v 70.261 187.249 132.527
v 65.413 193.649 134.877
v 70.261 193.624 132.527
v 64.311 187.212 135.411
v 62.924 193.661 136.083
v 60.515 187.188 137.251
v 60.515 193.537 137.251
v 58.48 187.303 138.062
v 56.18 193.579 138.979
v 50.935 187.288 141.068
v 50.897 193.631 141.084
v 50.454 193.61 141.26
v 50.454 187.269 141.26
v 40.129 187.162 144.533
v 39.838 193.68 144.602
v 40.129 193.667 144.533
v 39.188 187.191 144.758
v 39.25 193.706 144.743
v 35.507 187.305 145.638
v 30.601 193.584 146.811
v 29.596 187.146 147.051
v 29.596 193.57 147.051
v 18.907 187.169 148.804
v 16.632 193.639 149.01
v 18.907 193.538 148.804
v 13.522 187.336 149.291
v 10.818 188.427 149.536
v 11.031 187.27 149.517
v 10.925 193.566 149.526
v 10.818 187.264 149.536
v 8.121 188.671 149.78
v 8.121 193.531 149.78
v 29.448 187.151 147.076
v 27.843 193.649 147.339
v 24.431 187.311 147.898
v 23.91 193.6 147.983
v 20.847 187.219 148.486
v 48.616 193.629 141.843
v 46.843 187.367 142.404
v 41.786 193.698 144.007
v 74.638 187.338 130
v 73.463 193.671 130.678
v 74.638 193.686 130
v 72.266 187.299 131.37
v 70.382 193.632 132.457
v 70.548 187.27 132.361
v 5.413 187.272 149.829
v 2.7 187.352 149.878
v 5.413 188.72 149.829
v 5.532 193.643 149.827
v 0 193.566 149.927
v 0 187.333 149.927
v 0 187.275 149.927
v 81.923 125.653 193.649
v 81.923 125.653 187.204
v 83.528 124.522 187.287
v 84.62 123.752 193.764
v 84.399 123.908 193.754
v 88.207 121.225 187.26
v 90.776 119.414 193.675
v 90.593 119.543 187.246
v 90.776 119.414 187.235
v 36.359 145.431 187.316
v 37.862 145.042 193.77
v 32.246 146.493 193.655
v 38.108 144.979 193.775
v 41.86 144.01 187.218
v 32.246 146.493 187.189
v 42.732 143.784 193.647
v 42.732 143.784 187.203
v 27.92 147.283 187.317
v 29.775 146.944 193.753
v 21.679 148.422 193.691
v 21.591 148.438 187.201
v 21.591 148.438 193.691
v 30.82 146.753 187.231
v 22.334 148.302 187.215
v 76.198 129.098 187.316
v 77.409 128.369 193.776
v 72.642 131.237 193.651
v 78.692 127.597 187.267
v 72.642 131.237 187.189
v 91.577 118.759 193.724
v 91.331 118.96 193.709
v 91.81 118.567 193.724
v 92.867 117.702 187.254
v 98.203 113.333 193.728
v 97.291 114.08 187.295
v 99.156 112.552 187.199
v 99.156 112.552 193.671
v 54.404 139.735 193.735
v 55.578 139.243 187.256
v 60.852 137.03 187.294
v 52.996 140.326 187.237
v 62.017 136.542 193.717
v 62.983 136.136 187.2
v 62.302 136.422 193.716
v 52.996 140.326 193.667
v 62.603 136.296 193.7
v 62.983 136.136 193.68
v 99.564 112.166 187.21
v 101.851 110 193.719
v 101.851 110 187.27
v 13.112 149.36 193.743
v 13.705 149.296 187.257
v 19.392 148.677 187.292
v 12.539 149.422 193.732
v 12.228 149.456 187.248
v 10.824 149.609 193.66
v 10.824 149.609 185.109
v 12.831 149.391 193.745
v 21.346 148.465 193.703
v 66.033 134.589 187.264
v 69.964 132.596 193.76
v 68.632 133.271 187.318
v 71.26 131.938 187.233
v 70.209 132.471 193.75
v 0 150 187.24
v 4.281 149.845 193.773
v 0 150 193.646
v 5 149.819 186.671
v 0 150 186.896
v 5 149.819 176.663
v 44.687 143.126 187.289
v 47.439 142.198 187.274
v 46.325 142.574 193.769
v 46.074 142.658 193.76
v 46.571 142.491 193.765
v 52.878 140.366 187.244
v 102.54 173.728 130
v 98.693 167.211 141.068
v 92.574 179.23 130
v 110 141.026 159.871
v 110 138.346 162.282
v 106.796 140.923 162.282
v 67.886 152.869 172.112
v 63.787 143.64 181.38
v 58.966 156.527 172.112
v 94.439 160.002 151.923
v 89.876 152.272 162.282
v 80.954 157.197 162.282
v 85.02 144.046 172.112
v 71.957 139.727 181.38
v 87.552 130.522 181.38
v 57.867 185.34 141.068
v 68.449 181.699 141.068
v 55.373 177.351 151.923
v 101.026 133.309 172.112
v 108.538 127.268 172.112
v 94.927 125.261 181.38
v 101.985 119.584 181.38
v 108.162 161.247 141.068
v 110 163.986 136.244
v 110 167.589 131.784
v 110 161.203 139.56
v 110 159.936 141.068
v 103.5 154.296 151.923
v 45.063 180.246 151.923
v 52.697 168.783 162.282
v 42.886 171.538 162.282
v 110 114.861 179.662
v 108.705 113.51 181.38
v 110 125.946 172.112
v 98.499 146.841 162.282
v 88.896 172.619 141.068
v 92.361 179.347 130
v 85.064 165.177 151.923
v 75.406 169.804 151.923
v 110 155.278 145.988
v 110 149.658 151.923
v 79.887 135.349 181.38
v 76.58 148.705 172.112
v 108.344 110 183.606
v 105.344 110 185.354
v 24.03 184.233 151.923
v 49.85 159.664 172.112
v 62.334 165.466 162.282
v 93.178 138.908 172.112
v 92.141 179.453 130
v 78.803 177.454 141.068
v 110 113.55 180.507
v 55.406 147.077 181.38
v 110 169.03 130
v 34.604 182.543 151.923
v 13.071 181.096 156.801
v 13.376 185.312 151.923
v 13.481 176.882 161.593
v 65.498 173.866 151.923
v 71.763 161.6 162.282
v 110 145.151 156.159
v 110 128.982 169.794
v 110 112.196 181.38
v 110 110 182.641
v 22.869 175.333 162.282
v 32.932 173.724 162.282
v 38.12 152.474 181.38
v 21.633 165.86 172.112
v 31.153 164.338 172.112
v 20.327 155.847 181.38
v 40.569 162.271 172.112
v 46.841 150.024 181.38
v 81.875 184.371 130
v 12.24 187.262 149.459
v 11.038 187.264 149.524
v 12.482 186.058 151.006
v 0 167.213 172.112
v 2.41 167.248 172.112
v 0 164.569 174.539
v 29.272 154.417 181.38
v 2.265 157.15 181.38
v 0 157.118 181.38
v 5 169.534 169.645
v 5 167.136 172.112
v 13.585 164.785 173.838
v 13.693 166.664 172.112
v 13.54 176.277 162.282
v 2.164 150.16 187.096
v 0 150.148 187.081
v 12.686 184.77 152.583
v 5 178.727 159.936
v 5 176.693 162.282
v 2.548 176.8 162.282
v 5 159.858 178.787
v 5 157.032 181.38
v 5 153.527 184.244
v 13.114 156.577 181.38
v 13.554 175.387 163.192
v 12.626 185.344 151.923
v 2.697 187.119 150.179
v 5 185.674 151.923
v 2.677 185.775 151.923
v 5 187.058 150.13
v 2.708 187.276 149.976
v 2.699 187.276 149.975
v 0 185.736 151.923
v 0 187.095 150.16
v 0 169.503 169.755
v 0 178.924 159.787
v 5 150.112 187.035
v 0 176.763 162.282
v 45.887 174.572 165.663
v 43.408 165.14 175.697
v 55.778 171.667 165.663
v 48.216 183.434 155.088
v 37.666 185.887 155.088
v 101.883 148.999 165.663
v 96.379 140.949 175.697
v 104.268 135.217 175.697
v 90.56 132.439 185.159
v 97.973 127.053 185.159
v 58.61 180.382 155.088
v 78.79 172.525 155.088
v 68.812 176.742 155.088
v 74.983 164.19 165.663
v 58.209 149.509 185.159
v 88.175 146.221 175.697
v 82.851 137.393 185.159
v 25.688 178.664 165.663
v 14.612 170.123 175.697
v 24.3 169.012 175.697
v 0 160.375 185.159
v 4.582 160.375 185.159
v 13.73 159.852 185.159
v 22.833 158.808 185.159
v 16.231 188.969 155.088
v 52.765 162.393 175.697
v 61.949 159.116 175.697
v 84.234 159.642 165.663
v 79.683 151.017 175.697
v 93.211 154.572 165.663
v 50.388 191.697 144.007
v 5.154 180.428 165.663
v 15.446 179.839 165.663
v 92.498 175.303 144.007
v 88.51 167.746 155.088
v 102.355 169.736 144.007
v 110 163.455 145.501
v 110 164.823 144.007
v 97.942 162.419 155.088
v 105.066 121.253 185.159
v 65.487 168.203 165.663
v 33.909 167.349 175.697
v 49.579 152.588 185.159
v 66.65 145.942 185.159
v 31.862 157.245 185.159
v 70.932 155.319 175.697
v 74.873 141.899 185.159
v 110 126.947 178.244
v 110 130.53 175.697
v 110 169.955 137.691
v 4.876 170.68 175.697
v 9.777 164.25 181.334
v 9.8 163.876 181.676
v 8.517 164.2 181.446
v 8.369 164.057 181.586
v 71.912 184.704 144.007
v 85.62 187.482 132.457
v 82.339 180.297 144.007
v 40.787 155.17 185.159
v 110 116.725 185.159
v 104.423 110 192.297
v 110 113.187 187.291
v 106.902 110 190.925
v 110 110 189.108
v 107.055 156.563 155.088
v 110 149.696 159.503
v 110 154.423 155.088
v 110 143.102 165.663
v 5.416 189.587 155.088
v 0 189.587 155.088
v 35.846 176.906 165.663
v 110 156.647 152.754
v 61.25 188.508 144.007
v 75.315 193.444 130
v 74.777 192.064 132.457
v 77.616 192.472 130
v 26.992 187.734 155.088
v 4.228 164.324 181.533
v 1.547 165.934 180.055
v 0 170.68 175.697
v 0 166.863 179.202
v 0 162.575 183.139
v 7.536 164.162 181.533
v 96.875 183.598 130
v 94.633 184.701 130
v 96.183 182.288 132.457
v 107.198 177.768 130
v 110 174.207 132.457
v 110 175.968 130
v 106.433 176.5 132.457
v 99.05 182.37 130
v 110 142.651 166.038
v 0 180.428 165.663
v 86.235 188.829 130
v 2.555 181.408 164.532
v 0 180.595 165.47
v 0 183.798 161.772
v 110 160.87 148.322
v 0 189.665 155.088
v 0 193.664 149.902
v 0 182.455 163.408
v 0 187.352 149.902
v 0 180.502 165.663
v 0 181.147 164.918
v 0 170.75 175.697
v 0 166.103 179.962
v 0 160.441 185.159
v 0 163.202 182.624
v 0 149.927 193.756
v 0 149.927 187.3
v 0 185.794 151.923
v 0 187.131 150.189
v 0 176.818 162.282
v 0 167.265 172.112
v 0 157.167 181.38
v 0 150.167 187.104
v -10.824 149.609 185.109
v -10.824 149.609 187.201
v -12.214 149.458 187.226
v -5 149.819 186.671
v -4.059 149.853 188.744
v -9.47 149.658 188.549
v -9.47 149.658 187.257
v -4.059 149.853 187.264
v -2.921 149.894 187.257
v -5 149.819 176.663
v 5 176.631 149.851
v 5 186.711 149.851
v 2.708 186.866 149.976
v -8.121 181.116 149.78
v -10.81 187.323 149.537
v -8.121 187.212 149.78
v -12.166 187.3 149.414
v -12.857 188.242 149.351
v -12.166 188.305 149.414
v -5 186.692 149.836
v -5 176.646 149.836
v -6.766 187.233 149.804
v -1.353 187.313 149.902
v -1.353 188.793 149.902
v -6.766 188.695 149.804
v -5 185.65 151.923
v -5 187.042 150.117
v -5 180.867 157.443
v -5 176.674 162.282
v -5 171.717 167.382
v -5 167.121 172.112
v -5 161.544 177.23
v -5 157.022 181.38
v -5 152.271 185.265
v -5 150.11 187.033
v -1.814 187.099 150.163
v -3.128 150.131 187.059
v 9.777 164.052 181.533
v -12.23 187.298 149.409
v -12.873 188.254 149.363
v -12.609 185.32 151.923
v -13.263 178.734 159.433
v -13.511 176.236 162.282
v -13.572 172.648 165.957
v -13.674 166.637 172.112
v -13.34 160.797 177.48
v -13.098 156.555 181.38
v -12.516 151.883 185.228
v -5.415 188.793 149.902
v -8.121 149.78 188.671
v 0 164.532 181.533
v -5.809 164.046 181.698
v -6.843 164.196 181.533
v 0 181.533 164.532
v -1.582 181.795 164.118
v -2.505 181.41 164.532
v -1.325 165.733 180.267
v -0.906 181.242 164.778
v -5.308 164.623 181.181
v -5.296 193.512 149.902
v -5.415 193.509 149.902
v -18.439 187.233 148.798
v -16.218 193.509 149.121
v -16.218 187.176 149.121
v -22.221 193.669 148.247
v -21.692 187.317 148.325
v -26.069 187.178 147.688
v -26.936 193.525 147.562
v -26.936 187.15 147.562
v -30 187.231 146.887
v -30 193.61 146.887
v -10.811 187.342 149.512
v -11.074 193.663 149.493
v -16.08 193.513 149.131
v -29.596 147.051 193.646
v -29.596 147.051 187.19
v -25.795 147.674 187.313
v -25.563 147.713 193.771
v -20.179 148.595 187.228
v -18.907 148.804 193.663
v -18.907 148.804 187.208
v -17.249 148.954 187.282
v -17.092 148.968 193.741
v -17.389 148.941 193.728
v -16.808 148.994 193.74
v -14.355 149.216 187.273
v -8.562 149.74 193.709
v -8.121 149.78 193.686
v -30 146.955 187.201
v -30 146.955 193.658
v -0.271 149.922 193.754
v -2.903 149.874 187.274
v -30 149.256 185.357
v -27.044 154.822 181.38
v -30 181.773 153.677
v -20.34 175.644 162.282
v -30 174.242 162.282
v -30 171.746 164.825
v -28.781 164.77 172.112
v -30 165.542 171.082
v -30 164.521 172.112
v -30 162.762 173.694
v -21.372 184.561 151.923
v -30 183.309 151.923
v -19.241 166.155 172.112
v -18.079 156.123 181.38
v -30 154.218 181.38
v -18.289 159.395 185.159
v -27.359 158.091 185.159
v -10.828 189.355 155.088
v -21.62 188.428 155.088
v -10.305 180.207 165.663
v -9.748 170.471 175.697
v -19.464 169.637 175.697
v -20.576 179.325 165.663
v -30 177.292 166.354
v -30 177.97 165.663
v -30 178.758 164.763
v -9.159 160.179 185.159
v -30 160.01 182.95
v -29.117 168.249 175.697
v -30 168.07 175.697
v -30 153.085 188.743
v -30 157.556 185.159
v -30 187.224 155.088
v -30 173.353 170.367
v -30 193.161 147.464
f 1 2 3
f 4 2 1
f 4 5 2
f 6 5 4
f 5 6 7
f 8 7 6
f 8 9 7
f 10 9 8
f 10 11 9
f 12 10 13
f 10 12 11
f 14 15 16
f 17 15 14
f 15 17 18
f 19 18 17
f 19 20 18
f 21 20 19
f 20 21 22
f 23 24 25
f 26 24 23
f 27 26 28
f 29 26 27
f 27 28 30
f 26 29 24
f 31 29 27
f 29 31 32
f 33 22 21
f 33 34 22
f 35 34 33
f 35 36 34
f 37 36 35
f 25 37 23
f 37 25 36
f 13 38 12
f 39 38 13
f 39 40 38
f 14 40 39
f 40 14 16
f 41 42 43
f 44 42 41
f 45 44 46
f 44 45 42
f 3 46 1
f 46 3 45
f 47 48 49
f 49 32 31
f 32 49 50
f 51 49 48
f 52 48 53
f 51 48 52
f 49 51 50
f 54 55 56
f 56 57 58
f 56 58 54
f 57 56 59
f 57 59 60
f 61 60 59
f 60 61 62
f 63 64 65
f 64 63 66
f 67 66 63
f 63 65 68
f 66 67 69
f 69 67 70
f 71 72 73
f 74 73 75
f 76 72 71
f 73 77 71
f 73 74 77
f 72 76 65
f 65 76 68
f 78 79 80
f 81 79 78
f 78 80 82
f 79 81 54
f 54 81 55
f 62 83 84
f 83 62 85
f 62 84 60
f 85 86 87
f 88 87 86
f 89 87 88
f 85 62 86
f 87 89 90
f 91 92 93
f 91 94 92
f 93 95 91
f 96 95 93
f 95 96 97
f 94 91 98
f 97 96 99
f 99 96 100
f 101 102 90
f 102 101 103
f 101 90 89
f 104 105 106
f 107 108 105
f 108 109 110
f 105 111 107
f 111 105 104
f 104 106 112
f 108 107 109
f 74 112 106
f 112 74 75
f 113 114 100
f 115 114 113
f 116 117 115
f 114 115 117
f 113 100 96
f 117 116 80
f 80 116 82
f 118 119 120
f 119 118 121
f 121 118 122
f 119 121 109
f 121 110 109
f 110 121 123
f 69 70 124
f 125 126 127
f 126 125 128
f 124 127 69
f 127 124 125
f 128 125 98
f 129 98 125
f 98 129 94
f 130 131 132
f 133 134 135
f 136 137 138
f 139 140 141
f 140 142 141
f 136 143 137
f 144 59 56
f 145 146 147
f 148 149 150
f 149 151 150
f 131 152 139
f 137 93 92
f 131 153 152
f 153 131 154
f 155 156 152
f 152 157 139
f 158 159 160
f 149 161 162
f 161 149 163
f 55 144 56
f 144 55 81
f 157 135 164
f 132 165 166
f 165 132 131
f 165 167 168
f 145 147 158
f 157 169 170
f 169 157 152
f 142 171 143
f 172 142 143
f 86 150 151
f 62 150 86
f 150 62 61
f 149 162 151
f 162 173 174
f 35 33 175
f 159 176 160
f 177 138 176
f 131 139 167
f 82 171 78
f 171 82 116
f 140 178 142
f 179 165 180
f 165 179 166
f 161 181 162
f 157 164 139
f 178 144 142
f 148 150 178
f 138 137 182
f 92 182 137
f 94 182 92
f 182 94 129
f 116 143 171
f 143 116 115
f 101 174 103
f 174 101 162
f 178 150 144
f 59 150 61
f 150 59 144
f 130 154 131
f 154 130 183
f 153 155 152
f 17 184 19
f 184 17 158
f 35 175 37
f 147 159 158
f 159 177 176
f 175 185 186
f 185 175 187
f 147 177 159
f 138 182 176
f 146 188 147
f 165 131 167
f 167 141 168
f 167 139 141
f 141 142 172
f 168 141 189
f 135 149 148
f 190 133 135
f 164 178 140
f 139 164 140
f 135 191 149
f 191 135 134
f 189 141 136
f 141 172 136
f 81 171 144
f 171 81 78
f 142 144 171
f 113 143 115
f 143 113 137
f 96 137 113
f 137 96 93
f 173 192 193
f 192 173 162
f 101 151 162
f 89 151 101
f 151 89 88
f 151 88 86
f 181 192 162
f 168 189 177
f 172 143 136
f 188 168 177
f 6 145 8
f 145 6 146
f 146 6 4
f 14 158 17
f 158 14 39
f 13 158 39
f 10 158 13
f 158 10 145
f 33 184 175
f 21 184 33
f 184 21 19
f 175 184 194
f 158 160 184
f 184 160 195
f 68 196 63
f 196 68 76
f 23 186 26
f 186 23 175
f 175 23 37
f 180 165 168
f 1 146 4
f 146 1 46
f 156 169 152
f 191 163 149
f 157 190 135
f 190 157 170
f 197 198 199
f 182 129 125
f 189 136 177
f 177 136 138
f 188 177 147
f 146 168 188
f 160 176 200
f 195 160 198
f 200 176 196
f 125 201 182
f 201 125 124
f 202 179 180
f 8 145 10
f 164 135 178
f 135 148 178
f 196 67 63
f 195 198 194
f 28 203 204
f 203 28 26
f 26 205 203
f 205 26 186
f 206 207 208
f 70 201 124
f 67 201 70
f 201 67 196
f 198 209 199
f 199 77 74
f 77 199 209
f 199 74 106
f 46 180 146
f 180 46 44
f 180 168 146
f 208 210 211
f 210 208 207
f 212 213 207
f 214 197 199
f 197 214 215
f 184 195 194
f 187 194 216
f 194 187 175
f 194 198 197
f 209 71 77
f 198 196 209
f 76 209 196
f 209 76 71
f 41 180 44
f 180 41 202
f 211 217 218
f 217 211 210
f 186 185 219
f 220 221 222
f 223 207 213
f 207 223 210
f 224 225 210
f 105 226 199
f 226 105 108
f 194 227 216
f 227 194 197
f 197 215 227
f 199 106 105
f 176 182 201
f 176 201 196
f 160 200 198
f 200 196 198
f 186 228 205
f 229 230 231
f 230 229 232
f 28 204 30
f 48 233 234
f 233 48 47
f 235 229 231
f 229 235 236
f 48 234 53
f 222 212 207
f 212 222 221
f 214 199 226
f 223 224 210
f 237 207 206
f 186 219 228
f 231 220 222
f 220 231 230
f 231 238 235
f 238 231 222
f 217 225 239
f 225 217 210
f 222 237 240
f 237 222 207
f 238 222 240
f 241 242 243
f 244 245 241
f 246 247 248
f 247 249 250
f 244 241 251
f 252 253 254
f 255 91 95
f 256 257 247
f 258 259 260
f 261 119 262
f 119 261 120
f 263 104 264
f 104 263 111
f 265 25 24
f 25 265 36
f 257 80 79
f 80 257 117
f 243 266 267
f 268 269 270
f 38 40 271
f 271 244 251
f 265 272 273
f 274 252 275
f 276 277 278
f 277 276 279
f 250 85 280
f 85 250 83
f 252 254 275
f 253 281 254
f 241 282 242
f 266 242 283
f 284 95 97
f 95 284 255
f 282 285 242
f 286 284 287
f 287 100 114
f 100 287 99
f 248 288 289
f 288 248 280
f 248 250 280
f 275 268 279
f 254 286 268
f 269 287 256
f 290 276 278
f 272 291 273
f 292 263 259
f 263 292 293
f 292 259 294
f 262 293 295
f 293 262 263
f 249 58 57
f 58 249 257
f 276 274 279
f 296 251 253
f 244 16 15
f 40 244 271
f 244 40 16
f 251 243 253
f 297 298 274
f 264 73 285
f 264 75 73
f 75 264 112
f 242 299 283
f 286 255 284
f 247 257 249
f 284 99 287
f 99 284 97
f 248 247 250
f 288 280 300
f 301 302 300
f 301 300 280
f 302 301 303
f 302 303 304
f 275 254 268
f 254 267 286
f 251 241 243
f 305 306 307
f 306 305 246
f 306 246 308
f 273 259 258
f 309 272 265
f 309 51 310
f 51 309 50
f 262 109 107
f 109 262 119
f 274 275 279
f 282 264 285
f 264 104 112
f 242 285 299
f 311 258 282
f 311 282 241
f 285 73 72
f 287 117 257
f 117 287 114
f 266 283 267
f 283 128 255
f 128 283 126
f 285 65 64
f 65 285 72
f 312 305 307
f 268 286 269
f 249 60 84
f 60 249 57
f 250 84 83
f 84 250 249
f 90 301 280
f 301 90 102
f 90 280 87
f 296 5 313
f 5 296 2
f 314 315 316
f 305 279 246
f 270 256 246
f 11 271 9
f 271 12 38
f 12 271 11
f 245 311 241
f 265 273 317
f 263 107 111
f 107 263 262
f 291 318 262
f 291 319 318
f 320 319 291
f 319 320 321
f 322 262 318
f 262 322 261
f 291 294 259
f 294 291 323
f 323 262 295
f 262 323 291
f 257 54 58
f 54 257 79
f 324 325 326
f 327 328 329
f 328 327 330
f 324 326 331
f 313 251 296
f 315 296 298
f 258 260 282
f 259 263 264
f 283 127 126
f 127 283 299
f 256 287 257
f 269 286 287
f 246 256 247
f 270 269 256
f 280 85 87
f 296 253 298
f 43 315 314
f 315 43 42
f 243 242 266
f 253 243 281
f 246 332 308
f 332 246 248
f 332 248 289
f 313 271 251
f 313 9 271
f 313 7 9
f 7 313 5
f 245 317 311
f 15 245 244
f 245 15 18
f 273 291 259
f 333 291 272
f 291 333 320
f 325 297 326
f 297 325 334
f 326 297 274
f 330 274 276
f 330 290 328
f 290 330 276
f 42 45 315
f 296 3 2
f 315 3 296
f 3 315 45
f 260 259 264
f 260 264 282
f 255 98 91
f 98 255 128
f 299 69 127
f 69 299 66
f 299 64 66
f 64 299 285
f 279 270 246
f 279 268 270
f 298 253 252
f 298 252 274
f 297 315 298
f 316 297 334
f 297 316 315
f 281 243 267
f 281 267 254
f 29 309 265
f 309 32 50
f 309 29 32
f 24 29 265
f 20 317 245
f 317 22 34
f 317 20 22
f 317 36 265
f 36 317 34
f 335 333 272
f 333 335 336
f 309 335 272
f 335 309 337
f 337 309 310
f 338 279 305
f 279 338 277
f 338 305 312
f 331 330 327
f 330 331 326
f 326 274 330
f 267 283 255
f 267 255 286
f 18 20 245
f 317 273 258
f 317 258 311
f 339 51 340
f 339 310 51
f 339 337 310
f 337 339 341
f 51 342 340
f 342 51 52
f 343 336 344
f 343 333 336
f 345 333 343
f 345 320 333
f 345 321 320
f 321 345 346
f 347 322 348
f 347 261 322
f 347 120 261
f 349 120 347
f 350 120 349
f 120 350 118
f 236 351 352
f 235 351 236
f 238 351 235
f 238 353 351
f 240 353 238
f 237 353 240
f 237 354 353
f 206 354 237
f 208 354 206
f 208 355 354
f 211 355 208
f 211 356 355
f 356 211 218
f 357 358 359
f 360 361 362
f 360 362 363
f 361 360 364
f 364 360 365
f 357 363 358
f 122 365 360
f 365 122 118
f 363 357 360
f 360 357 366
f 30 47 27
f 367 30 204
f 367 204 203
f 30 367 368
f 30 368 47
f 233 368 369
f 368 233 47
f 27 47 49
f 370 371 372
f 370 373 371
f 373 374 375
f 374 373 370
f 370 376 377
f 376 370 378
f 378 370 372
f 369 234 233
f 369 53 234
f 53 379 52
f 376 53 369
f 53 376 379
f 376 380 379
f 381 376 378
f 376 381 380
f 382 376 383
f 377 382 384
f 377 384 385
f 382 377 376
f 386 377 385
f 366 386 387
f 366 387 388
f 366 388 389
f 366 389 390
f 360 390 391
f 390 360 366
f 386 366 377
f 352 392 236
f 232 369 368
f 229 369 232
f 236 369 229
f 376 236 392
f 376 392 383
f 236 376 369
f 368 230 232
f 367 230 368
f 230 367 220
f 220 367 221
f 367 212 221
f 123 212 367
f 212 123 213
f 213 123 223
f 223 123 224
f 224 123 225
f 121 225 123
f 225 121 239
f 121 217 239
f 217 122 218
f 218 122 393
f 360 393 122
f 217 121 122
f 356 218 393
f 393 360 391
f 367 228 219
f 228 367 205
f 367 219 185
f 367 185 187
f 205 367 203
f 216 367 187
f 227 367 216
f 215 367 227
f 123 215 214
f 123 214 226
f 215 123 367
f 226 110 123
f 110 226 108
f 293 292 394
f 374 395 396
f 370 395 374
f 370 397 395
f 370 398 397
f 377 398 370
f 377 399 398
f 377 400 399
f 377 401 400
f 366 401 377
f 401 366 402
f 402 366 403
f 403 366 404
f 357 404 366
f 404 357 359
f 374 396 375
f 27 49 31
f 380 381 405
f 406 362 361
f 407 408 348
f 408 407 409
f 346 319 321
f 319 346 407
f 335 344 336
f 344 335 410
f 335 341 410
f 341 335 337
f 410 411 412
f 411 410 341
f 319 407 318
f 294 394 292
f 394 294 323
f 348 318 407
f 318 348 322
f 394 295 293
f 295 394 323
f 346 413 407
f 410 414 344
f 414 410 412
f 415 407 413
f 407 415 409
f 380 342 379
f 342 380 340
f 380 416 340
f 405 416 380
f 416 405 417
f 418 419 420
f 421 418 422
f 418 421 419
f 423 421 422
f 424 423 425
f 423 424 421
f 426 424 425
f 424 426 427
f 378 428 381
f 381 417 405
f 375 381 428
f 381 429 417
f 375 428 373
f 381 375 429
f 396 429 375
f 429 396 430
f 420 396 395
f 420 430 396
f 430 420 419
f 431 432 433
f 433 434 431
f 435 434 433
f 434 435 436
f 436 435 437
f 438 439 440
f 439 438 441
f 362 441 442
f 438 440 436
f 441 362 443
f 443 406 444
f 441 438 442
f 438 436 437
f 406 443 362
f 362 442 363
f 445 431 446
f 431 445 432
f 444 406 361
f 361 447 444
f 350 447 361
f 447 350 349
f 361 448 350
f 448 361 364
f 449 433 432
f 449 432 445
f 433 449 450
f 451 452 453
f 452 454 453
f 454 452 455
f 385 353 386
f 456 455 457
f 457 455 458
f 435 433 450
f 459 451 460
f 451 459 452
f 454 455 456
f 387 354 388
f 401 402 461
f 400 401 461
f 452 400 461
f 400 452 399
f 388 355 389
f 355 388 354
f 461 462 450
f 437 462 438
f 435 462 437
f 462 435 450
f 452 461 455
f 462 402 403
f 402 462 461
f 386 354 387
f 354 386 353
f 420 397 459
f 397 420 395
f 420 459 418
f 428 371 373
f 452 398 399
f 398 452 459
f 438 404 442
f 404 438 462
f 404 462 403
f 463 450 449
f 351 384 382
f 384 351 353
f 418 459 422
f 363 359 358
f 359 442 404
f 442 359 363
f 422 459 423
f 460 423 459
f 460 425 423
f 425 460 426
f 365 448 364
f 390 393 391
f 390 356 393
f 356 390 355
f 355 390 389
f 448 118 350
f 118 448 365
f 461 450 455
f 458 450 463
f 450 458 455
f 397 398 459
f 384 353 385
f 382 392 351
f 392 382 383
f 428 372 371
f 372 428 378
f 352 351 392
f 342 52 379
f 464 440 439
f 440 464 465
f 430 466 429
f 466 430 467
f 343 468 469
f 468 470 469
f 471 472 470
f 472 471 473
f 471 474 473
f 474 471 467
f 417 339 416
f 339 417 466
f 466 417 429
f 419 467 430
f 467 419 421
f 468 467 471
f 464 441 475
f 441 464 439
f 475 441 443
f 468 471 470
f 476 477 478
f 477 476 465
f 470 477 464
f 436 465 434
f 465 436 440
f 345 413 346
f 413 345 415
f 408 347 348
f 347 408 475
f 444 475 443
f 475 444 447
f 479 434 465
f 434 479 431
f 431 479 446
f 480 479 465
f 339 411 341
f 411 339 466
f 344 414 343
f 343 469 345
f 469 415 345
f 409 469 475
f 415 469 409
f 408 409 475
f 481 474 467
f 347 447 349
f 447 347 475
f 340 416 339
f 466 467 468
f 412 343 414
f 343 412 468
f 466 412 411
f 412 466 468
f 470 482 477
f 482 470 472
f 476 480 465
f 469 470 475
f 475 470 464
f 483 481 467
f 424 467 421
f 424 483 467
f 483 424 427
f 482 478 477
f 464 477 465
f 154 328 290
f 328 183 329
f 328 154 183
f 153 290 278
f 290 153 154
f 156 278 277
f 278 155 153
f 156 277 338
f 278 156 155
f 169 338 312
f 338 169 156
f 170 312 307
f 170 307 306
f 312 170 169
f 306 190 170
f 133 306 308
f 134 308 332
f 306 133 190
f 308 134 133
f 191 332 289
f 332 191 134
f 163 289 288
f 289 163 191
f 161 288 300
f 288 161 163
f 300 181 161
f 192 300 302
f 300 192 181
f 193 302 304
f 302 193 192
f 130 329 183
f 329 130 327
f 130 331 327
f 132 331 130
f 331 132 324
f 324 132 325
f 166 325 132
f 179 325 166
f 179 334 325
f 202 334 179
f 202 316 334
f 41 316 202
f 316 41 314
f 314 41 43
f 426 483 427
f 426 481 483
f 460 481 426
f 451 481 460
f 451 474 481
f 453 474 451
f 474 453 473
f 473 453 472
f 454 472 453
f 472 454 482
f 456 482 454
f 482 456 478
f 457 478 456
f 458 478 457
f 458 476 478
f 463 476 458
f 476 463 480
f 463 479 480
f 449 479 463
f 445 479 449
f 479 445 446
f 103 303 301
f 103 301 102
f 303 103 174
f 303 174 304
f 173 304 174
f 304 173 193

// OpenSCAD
// file: ../motors/MN5212.scad
use <../utils.scad>

module MN5212(){

	render(){
		translate([0,0, 42.5 / 2 - 23 / 2 - 4.9 - 6])
			cylinder(
				h = 23,
				r = 59 / 2,
				$fa = fa(59 / 2),
				center = true);
		translate([0,0, 42.5 / 2 - 4.9 / 2 - 6])
			cylinder(
				h = 4.9,
				r1 = 59 / 2,
				r2 = 24.8 / 2,
				$fa = fa(59 / 2),
				center = true);
		translate([0,0, - 42.5 / 2 + 5.6 / 2 + 3])
			cylinder(
				h = 5.6,
				r1 = 44 / 2,
				r2 = 59 / 2,
				$fa = fa(59 / 2),
				center = true);
		translate([0, 0, 42.5 / 2 - 3])
			cylinder(
				h = 6,
				r = 4 / 2,
				$fa = fa(4 / 2),
				center = true);
		translate([0, 0, - 42.5 / 2 + 1.5])
			cylinder(
				h = 3,
				r = 6 / 2,
				$fa = fa(6 / 2),
				center = true);
	}

}
// file: ../servos/HS_5065MG.scad
use <../utils.scad>

module HS_5065MG(){

	length = 23.75;
	width = 11.68;
	depth = 20.32;
	wing_width = 32.38;
	wing_thick = 3.43;
	shaft_offset = 6;
	hole_spacing = 28.32;
	shaft_height = 26.16;
	shaft_length = 2;

	module mounting_hole(){
		mh_rad = 2 / 2;
		translate(
			[
				hole_spacing / 2,
				0,
				depth / 2 - wing_thick / 2
			])
			cylinder(h = 5, r = mh_rad, $fa = fa(mh_rad), center = true);
	}

	difference(){
		union(){
			cube([length, width, depth], center = true);
			translate([0, 0, depth / 2 - wing_thick / 2])
				cube([wing_width, width, wing_thick], center = true);
			translate(
				[
					- length / 2 + shaft_offset,
					0,
					shaft_height - length / 2 + shaft_length / 2
				])
				cylinder(
					h = shaft_length,
					r = 1.5,
					$fa = fa(1.5),
					center = true);
		}	union(){

			mounting_hole();
			mirror() mounting_hole();
		}
	}
}

HS_5065MG();
// file: ../servos/LS_0006_servo.scad
// Author Michael Marques (DrYerzinia)

use <../utils.scad>

module ls_0006_servo(){
	
	length = 21.4;
	depth = 19.9;
	thickness = 11.65;

	gear_height = 2.6;
	gear_bump_height = 0.7;
	gear_bump_diameter = 1.97;
	gear_outer_bump_diameter = 6;
	gear_bump_offset = 12.2;

	shaft_height = 2.4;
	shaft_diameter = 3.74;
	shaft_offset = thickness / 2;
	shaft_screw_diameter = 1.3;
	
	wing_outer_width = 8.5;
	wing_top_off = 3.8;
	wing_length = 3.8;
	wing_thickness = 1.2;
	wing_hole_diameter = 1.85;
	wing_hole_edge_dist = 2;

	module wing_hole(){
		translate(
			[
				length / 2 + wing_hole_edge_dist,
				0,
				depth/2 - wing_top_off - wing_thickness / 2
			])
			cylinder(
				h = wing_thickness + 1,
				r = wing_hole_diameter / 2,
				$fn = 16,
				center = true);
	}

	module wing(){
		translate(
			[
				length / 2,
				thickness / 2,
				depth/2 - wing_top_off - wing_thickness
			])
			rotate([0,0,-90])
				trapezoid(
					thickness,
					wing_outer_width,
					wing_length,
					wing_thickness);
	}

	// Body
	cube([length, thickness, depth], center = true);

	difference(){
		union(){

			wing();
			mirror() wing();

			// Gear Bumps
			translate([0, 0, depth/2 + gear_height / 2]){
				translate([length / 2 - gear_bump_offset, 0, 0])
					cylinder(
						h = gear_height,
						r = gear_outer_bump_diameter / 2,
						$fn = 16,
						center = true);
				translate([length / 2 - gear_bump_offset, 0, gear_height/2 + gear_bump_height / 2])
					cylinder(
						h = gear_bump_height,
						r = gear_bump_diameter / 2,
						$fn = 16,
						center = true);
				translate([length / 2 - shaft_offset, 0, 0])
					cylinder(
						h = gear_height,
						r = thickness / 2,
						$fn = 32,
						center = true);
				// Shaft
				translate([length / 2 - shaft_offset, 0, gear_height])
					cylinder(
						h = shaft_height,
						r = shaft_diameter / 2,
						$fn = 16,
						center = true);
			}

		}
		union(){

			wing_hole();
			mirror() wing_hole();

			// Shaft_hole
			translate(
				[
					length / 2 - shaft_offset,
					0,
					depth/2 + gear_height * (3 / 2) + 0.5])
				cylinder(
					h = shaft_height + 1,
					r = shaft_screw_diameter / 2,
					$fn = 16,
					center = true);

		}
	}

}

module translate_ls_0006_attachment(){

	length = 21.4;
	thickness = 11.65;
	shaft_offset = thickness / 2;
	depth = 19.9;
	float = 3.3;

	translate([length / 2 - shaft_offset, 0, depth / 2 + float])
		children();

}

module bar_attachment(){

	height = 3.75;
	bar_length = 14.7;
	bar_thickness = 1.6;
	inner_radius = 5.9;
	outer_radius = 3.95;
	shaft_diameter = 3.7;
	upper_void_diameter = 4.8;
	screw_diameter = 2;
	hole_spacing = 2;
	hole_4_diameter = 1.2;
	hole_diameter = 1;
	hole_start_off = 4.7;
	top_void_depth = 0.67;
	bottom_void_depth = 1.84;

	translate([0, 0, height / 2]){
		difference(){
			union(){

				translate([0, inner_radius / 2, height / 2 - bar_thickness])
					rotate([0,0,-90])
						trapezoid(
							inner_radius,
							outer_radius,
							bar_length,
							bar_thickness);

				cylinder(
					h = height,
					r = inner_radius / 2,
					$fn = 16,
					center = true);

				translate([bar_length, 0, height / 2 - bar_thickness / 2])
					cylinder(
						h = bar_thickness,
						r = outer_radius / 2,
						$fn = 16,
						center = true);

			}
			union(){
				// screwhole
				cylinder(
					h = height + 1,
					r = screw_diameter / 2,
					$fn = 16,
					center = true);
				// voids
				translate([0, 0, height / 2 - top_void_depth / 2 + 0.5])
					cylinder(
						h = top_void_depth + 1,
						r = upper_void_diameter / 2,
						$fn = 16,
						center = true);
				translate([0, 0,  - bottom_void_depth / 2 - 0.5])
					cylinder(
						h = bottom_void_depth + 1,
						r = shaft_diameter / 2,
						$fn = 16,
						center = true);

				for(i = [0:4]){
					dia = (i != 3) ? hole_diameter : hole_4_diameter;
					translate(
						[
							hole_start_off + hole_spacing * i,
							0,
							height / 2 - bar_thickness / 2])
						cylinder(
							h = bar_thickness + 1,
							r = dia / 2,
							$fn = 16,
							center = true);
				}

			}
		}
	}

}

ls_0006_servo();
translate_ls_0006_attachment() bar_attachment();
// file: ../servos/parallax_continuous_rotation_servo.scad
// Author Michael Marques (DrYerzinia)

module parallax_continuous_rotation_servo(){

	depth = 37.7;
	length = 40.75;
	width = 19.75;

	mount_height = 2.7;
	mount_extent = 6.1;
	mount_from_top = 7.7;

	mount_hole_diameter = 4.46;
	mount_hole_spacing = 14.4 - mount_hole_diameter;

	shaft_diameter = 5.8;
	shaft_offset = 10;
	shaft_length = 3.5;

	module mounting_hole(){

			translate(
				[
					length / 2 + 5,
					mount_hole_spacing / 2,
					depth / 2 - mount_height / 2 - mount_from_top
				]
				)
				cylinder(
					h = mount_height + 1,
					r = mount_hole_diameter / 2,
					$fn=16,
					center = true);
	}

	difference(){
		union(){

			// Body
			cube([length,width,depth], center = true);

			// Mounting wings
			translate(
				[
					0,
					0,
					depth / 2 - mount_height / 2 - mount_from_top
				])
				cube(
					[
						length + mount_extent * 2,
						width,
						mount_height
					],
					center = true);

			// Shaft
			translate(
				[
					length / 2 - shaft_offset,
					0,
					depth / 2 + shaft_length / 2
				]
				)
				cylinder(
					h = shaft_length,
					r = shaft_diameter / 2,
					$fn = 16,
					center = true
				);

		}
		union(){

			// Mounting Holes
			mounting_hole();
			mirror()
				mounting_hole();

			translate([0,-mount_hole_spacing,0]){
				mounting_hole();
				mirror()
					mounting_hole();
			}
		}
	}

}

module translate_shaft(){

	depth = 37.7;
	length = 40.75;

	shaft_offset = 10;

	translate(
		[
			length / 2 - shaft_offset,
			0,
			depth / 2
		])
		children();
}

module round_servo_attachment(){

	height = 6;
	diameter = 20.8;
	inner_diameter = 8.6;
	plate_thickness = 2.45;

	float = 2;

	depth = 37.7;
	length = 40.75;

	shaft_offset = 10;

	plate_hole_spacing = 14.5;
	plate_hole_diameter = 1.4;
	plate_hole_minor_spacing = 3.5;

	screw_hole_diameter = 3;

	inner_diameter = 8;
	
	top_depth = 1.8;
	bottom_depth = 3.4;

	void_diameter = 5.8;

	module plate_hole(){
		cylinder(
			h = plate_thickness + 1,
			r = plate_hole_diameter / 2,
			$fn = 16,
			center = true
		);
	}

	module plate_hole_group(){
		translate([0, 0, height / 2 - plate_thickness / 2]){
			translate([0, plate_hole_spacing / 2, 0]){
					plate_hole();
					translate([- plate_hole_minor_spacing, 0, 0])
						plate_hole();
					translate([  plate_hole_minor_spacing, 0, 0])
						plate_hole();
			}
		}
	}

	translate(
		[
			length / 2 - shaft_offset,
			0,
			depth / 2 + height / 2 + float
		]
		)
		difference(){

			union(){

				// inner shaft
				cylinder(
					h = height,
					r = inner_diameter / 2,
					$fn = 16,
					center = true
				);

				// top
				translate([0, 0, height / 2 - plate_thickness / 2])
					cylinder(
						h = plate_thickness,
						r = diameter / 2,
						$fn = 32,
						center = true
					);
			}

			union(){

				// plate holes
				for(ang = [0:3]){
					rotate([0,0, ang * 90])
						plate_hole_group();
				}

				// screw hole
				cylinder(
					h = height + 1,
					r = screw_hole_diameter / 2,
					$fn = 16,
					center = true
				);

				// inner voids
				translate([0, 0, height / 2 - top_depth / 2 + 1])
					cylinder(
						h = top_depth + 1,
						r = void_diameter / 2,
						$fn = 16,
						center = true
					);
				translate([0, 0, -1])
					cylinder(
						h = bottom_depth + 1,
						r = void_diameter / 2,
						$fn = 16,
						center = true
					);

			}

		}

}

parallax_continuous_rotation_servo();
round_servo_attachment();
// file: ../hardware.scad
 // Author Michael Marques (DrYerzinia)

// http://www.ebay.com/itm/10-PCS-683-3x7x2-mm-Metal-OPEN-PRECISION-Miniature-Ball-Bearing-3-7-2-/291206307942?hash=item43cd3fa066:m:mCi6eovrGVk_CjIUjlhw8yg
// E-Bay empire.rc

module washer_M3_7x3_2x0_5mm(){

	difference(){
		cylinder(
			h = 0.5,
			r = 7 / 2,
			$fn = 16,
			center = true);
		cylinder(
			h = 0.5 + 0.1,
			r = 3.2 / 2,
			$fn = 16,
			center = true);
	}

}

module bearing_3x7x2mm(){

	difference(){
		cylinder(
			h = 2,
			r = 7 / 2,
			$fn = 16,
			center = true);
		cylinder(
			h = 2 + 1,
			r = 3 / 2,
			$fn = 16,
			center = true);
	}

}

module bearing_5x8x2_5mm(){

	difference(){
		cylinder(
			h = 2.5,
			r = 8 / 2,
			$fn = 16,
			center = true);
		cylinder(
			h = 2.5 + 1,
			r = 5 / 2,
			$fn = 16,
			center = true);
	}

}

module bearing_8x16x5mm(){

	difference(){
		cylinder(
			h = 5,
			r = 16 / 2,
			$fn = 16,
			center = true);
		cylinder(
			h = 5 + 1,
			r = 8 / 2,
			$fn = 16,
			center = true);
	}

}


bearing_5x8x2_5mm();
// file: ../utils.scad
// http://forum.openscad.org/Creating-pie-pizza-slice-shape-need-a-dynamic-length-array-td3148.html

module pie_slice(r, start_angle, end_angle) {
    R = r * sqrt(2) + 1;
    a0 = (4 * start_angle + 0 * end_angle) / 4;
    a1 = (3 * start_angle + 1 * end_angle) / 4;
    a2 = (2 * start_angle + 2 * end_angle) / 4;
    a3 = (1 * start_angle + 3 * end_angle) / 4;
    a4 = (0 * start_angle + 4 * end_angle) / 4;
    if(end_angle > start_angle)
        intersection() {
        circle(r, $fa = fa(r));
        polygon([
            [0,0],
            [R * cos(a0), R * sin(a0)],
            [R * cos(a1), R * sin(a1)],
            [R * cos(a2), R * sin(a2)],
            [R * cos(a3), R * sin(a3)],
            [R * cos(a4), R * sin(a4)],
            [0,0]
       ]);
    }
}

// https://github.com/openscad/openscad/issues/29

module rotate_about(v,a) {
	translate(v) rotate(a) translate(-v) children(0);
}

module rotate_about_axis(v, ang, axis) {
	translate(v) rotate(ang, axis) translate(-v) children(0);
}

// https://github.com/robofun/openscad-utils/blob/master/trapezoid.scad

module trapezoid(width_base, width_top,height,thickness) {
	

  linear_extrude(height = thickness) polygon(points=[[0,0],[width_base,0],[width_base-(width_base-width_top)/2,height],[(width_base-width_top)/2,height]], paths=[[0,1,2,3]]); 
  
}

// http://forum.openscad.org/fe-Tolerance-based-arc-approximation-td14212.html

function fa(r)=($fn>0)?360/$fn:($fe>0)?($fe<r)?min(45,2*acos(1-$fe/r)):45:$fa; 
// file: ../render_settings.scad
// Author Michael Marques (DrYerzinia)

// Lulzbot Mini tolerances
// x/y 0.1mm
// z   0.05mm
//
// 0.1mm   preview tolerance
// 0.025mm export  tolerance

$fs = 0.01;
$fn = undef;
$fa = 360 / 5;

$fe = 0.025;	// export
// main file
// Author Michael Marques (DrYerzinia)

include <../render_settings.scad>

use <../BB8.scad>

Body_P10();
